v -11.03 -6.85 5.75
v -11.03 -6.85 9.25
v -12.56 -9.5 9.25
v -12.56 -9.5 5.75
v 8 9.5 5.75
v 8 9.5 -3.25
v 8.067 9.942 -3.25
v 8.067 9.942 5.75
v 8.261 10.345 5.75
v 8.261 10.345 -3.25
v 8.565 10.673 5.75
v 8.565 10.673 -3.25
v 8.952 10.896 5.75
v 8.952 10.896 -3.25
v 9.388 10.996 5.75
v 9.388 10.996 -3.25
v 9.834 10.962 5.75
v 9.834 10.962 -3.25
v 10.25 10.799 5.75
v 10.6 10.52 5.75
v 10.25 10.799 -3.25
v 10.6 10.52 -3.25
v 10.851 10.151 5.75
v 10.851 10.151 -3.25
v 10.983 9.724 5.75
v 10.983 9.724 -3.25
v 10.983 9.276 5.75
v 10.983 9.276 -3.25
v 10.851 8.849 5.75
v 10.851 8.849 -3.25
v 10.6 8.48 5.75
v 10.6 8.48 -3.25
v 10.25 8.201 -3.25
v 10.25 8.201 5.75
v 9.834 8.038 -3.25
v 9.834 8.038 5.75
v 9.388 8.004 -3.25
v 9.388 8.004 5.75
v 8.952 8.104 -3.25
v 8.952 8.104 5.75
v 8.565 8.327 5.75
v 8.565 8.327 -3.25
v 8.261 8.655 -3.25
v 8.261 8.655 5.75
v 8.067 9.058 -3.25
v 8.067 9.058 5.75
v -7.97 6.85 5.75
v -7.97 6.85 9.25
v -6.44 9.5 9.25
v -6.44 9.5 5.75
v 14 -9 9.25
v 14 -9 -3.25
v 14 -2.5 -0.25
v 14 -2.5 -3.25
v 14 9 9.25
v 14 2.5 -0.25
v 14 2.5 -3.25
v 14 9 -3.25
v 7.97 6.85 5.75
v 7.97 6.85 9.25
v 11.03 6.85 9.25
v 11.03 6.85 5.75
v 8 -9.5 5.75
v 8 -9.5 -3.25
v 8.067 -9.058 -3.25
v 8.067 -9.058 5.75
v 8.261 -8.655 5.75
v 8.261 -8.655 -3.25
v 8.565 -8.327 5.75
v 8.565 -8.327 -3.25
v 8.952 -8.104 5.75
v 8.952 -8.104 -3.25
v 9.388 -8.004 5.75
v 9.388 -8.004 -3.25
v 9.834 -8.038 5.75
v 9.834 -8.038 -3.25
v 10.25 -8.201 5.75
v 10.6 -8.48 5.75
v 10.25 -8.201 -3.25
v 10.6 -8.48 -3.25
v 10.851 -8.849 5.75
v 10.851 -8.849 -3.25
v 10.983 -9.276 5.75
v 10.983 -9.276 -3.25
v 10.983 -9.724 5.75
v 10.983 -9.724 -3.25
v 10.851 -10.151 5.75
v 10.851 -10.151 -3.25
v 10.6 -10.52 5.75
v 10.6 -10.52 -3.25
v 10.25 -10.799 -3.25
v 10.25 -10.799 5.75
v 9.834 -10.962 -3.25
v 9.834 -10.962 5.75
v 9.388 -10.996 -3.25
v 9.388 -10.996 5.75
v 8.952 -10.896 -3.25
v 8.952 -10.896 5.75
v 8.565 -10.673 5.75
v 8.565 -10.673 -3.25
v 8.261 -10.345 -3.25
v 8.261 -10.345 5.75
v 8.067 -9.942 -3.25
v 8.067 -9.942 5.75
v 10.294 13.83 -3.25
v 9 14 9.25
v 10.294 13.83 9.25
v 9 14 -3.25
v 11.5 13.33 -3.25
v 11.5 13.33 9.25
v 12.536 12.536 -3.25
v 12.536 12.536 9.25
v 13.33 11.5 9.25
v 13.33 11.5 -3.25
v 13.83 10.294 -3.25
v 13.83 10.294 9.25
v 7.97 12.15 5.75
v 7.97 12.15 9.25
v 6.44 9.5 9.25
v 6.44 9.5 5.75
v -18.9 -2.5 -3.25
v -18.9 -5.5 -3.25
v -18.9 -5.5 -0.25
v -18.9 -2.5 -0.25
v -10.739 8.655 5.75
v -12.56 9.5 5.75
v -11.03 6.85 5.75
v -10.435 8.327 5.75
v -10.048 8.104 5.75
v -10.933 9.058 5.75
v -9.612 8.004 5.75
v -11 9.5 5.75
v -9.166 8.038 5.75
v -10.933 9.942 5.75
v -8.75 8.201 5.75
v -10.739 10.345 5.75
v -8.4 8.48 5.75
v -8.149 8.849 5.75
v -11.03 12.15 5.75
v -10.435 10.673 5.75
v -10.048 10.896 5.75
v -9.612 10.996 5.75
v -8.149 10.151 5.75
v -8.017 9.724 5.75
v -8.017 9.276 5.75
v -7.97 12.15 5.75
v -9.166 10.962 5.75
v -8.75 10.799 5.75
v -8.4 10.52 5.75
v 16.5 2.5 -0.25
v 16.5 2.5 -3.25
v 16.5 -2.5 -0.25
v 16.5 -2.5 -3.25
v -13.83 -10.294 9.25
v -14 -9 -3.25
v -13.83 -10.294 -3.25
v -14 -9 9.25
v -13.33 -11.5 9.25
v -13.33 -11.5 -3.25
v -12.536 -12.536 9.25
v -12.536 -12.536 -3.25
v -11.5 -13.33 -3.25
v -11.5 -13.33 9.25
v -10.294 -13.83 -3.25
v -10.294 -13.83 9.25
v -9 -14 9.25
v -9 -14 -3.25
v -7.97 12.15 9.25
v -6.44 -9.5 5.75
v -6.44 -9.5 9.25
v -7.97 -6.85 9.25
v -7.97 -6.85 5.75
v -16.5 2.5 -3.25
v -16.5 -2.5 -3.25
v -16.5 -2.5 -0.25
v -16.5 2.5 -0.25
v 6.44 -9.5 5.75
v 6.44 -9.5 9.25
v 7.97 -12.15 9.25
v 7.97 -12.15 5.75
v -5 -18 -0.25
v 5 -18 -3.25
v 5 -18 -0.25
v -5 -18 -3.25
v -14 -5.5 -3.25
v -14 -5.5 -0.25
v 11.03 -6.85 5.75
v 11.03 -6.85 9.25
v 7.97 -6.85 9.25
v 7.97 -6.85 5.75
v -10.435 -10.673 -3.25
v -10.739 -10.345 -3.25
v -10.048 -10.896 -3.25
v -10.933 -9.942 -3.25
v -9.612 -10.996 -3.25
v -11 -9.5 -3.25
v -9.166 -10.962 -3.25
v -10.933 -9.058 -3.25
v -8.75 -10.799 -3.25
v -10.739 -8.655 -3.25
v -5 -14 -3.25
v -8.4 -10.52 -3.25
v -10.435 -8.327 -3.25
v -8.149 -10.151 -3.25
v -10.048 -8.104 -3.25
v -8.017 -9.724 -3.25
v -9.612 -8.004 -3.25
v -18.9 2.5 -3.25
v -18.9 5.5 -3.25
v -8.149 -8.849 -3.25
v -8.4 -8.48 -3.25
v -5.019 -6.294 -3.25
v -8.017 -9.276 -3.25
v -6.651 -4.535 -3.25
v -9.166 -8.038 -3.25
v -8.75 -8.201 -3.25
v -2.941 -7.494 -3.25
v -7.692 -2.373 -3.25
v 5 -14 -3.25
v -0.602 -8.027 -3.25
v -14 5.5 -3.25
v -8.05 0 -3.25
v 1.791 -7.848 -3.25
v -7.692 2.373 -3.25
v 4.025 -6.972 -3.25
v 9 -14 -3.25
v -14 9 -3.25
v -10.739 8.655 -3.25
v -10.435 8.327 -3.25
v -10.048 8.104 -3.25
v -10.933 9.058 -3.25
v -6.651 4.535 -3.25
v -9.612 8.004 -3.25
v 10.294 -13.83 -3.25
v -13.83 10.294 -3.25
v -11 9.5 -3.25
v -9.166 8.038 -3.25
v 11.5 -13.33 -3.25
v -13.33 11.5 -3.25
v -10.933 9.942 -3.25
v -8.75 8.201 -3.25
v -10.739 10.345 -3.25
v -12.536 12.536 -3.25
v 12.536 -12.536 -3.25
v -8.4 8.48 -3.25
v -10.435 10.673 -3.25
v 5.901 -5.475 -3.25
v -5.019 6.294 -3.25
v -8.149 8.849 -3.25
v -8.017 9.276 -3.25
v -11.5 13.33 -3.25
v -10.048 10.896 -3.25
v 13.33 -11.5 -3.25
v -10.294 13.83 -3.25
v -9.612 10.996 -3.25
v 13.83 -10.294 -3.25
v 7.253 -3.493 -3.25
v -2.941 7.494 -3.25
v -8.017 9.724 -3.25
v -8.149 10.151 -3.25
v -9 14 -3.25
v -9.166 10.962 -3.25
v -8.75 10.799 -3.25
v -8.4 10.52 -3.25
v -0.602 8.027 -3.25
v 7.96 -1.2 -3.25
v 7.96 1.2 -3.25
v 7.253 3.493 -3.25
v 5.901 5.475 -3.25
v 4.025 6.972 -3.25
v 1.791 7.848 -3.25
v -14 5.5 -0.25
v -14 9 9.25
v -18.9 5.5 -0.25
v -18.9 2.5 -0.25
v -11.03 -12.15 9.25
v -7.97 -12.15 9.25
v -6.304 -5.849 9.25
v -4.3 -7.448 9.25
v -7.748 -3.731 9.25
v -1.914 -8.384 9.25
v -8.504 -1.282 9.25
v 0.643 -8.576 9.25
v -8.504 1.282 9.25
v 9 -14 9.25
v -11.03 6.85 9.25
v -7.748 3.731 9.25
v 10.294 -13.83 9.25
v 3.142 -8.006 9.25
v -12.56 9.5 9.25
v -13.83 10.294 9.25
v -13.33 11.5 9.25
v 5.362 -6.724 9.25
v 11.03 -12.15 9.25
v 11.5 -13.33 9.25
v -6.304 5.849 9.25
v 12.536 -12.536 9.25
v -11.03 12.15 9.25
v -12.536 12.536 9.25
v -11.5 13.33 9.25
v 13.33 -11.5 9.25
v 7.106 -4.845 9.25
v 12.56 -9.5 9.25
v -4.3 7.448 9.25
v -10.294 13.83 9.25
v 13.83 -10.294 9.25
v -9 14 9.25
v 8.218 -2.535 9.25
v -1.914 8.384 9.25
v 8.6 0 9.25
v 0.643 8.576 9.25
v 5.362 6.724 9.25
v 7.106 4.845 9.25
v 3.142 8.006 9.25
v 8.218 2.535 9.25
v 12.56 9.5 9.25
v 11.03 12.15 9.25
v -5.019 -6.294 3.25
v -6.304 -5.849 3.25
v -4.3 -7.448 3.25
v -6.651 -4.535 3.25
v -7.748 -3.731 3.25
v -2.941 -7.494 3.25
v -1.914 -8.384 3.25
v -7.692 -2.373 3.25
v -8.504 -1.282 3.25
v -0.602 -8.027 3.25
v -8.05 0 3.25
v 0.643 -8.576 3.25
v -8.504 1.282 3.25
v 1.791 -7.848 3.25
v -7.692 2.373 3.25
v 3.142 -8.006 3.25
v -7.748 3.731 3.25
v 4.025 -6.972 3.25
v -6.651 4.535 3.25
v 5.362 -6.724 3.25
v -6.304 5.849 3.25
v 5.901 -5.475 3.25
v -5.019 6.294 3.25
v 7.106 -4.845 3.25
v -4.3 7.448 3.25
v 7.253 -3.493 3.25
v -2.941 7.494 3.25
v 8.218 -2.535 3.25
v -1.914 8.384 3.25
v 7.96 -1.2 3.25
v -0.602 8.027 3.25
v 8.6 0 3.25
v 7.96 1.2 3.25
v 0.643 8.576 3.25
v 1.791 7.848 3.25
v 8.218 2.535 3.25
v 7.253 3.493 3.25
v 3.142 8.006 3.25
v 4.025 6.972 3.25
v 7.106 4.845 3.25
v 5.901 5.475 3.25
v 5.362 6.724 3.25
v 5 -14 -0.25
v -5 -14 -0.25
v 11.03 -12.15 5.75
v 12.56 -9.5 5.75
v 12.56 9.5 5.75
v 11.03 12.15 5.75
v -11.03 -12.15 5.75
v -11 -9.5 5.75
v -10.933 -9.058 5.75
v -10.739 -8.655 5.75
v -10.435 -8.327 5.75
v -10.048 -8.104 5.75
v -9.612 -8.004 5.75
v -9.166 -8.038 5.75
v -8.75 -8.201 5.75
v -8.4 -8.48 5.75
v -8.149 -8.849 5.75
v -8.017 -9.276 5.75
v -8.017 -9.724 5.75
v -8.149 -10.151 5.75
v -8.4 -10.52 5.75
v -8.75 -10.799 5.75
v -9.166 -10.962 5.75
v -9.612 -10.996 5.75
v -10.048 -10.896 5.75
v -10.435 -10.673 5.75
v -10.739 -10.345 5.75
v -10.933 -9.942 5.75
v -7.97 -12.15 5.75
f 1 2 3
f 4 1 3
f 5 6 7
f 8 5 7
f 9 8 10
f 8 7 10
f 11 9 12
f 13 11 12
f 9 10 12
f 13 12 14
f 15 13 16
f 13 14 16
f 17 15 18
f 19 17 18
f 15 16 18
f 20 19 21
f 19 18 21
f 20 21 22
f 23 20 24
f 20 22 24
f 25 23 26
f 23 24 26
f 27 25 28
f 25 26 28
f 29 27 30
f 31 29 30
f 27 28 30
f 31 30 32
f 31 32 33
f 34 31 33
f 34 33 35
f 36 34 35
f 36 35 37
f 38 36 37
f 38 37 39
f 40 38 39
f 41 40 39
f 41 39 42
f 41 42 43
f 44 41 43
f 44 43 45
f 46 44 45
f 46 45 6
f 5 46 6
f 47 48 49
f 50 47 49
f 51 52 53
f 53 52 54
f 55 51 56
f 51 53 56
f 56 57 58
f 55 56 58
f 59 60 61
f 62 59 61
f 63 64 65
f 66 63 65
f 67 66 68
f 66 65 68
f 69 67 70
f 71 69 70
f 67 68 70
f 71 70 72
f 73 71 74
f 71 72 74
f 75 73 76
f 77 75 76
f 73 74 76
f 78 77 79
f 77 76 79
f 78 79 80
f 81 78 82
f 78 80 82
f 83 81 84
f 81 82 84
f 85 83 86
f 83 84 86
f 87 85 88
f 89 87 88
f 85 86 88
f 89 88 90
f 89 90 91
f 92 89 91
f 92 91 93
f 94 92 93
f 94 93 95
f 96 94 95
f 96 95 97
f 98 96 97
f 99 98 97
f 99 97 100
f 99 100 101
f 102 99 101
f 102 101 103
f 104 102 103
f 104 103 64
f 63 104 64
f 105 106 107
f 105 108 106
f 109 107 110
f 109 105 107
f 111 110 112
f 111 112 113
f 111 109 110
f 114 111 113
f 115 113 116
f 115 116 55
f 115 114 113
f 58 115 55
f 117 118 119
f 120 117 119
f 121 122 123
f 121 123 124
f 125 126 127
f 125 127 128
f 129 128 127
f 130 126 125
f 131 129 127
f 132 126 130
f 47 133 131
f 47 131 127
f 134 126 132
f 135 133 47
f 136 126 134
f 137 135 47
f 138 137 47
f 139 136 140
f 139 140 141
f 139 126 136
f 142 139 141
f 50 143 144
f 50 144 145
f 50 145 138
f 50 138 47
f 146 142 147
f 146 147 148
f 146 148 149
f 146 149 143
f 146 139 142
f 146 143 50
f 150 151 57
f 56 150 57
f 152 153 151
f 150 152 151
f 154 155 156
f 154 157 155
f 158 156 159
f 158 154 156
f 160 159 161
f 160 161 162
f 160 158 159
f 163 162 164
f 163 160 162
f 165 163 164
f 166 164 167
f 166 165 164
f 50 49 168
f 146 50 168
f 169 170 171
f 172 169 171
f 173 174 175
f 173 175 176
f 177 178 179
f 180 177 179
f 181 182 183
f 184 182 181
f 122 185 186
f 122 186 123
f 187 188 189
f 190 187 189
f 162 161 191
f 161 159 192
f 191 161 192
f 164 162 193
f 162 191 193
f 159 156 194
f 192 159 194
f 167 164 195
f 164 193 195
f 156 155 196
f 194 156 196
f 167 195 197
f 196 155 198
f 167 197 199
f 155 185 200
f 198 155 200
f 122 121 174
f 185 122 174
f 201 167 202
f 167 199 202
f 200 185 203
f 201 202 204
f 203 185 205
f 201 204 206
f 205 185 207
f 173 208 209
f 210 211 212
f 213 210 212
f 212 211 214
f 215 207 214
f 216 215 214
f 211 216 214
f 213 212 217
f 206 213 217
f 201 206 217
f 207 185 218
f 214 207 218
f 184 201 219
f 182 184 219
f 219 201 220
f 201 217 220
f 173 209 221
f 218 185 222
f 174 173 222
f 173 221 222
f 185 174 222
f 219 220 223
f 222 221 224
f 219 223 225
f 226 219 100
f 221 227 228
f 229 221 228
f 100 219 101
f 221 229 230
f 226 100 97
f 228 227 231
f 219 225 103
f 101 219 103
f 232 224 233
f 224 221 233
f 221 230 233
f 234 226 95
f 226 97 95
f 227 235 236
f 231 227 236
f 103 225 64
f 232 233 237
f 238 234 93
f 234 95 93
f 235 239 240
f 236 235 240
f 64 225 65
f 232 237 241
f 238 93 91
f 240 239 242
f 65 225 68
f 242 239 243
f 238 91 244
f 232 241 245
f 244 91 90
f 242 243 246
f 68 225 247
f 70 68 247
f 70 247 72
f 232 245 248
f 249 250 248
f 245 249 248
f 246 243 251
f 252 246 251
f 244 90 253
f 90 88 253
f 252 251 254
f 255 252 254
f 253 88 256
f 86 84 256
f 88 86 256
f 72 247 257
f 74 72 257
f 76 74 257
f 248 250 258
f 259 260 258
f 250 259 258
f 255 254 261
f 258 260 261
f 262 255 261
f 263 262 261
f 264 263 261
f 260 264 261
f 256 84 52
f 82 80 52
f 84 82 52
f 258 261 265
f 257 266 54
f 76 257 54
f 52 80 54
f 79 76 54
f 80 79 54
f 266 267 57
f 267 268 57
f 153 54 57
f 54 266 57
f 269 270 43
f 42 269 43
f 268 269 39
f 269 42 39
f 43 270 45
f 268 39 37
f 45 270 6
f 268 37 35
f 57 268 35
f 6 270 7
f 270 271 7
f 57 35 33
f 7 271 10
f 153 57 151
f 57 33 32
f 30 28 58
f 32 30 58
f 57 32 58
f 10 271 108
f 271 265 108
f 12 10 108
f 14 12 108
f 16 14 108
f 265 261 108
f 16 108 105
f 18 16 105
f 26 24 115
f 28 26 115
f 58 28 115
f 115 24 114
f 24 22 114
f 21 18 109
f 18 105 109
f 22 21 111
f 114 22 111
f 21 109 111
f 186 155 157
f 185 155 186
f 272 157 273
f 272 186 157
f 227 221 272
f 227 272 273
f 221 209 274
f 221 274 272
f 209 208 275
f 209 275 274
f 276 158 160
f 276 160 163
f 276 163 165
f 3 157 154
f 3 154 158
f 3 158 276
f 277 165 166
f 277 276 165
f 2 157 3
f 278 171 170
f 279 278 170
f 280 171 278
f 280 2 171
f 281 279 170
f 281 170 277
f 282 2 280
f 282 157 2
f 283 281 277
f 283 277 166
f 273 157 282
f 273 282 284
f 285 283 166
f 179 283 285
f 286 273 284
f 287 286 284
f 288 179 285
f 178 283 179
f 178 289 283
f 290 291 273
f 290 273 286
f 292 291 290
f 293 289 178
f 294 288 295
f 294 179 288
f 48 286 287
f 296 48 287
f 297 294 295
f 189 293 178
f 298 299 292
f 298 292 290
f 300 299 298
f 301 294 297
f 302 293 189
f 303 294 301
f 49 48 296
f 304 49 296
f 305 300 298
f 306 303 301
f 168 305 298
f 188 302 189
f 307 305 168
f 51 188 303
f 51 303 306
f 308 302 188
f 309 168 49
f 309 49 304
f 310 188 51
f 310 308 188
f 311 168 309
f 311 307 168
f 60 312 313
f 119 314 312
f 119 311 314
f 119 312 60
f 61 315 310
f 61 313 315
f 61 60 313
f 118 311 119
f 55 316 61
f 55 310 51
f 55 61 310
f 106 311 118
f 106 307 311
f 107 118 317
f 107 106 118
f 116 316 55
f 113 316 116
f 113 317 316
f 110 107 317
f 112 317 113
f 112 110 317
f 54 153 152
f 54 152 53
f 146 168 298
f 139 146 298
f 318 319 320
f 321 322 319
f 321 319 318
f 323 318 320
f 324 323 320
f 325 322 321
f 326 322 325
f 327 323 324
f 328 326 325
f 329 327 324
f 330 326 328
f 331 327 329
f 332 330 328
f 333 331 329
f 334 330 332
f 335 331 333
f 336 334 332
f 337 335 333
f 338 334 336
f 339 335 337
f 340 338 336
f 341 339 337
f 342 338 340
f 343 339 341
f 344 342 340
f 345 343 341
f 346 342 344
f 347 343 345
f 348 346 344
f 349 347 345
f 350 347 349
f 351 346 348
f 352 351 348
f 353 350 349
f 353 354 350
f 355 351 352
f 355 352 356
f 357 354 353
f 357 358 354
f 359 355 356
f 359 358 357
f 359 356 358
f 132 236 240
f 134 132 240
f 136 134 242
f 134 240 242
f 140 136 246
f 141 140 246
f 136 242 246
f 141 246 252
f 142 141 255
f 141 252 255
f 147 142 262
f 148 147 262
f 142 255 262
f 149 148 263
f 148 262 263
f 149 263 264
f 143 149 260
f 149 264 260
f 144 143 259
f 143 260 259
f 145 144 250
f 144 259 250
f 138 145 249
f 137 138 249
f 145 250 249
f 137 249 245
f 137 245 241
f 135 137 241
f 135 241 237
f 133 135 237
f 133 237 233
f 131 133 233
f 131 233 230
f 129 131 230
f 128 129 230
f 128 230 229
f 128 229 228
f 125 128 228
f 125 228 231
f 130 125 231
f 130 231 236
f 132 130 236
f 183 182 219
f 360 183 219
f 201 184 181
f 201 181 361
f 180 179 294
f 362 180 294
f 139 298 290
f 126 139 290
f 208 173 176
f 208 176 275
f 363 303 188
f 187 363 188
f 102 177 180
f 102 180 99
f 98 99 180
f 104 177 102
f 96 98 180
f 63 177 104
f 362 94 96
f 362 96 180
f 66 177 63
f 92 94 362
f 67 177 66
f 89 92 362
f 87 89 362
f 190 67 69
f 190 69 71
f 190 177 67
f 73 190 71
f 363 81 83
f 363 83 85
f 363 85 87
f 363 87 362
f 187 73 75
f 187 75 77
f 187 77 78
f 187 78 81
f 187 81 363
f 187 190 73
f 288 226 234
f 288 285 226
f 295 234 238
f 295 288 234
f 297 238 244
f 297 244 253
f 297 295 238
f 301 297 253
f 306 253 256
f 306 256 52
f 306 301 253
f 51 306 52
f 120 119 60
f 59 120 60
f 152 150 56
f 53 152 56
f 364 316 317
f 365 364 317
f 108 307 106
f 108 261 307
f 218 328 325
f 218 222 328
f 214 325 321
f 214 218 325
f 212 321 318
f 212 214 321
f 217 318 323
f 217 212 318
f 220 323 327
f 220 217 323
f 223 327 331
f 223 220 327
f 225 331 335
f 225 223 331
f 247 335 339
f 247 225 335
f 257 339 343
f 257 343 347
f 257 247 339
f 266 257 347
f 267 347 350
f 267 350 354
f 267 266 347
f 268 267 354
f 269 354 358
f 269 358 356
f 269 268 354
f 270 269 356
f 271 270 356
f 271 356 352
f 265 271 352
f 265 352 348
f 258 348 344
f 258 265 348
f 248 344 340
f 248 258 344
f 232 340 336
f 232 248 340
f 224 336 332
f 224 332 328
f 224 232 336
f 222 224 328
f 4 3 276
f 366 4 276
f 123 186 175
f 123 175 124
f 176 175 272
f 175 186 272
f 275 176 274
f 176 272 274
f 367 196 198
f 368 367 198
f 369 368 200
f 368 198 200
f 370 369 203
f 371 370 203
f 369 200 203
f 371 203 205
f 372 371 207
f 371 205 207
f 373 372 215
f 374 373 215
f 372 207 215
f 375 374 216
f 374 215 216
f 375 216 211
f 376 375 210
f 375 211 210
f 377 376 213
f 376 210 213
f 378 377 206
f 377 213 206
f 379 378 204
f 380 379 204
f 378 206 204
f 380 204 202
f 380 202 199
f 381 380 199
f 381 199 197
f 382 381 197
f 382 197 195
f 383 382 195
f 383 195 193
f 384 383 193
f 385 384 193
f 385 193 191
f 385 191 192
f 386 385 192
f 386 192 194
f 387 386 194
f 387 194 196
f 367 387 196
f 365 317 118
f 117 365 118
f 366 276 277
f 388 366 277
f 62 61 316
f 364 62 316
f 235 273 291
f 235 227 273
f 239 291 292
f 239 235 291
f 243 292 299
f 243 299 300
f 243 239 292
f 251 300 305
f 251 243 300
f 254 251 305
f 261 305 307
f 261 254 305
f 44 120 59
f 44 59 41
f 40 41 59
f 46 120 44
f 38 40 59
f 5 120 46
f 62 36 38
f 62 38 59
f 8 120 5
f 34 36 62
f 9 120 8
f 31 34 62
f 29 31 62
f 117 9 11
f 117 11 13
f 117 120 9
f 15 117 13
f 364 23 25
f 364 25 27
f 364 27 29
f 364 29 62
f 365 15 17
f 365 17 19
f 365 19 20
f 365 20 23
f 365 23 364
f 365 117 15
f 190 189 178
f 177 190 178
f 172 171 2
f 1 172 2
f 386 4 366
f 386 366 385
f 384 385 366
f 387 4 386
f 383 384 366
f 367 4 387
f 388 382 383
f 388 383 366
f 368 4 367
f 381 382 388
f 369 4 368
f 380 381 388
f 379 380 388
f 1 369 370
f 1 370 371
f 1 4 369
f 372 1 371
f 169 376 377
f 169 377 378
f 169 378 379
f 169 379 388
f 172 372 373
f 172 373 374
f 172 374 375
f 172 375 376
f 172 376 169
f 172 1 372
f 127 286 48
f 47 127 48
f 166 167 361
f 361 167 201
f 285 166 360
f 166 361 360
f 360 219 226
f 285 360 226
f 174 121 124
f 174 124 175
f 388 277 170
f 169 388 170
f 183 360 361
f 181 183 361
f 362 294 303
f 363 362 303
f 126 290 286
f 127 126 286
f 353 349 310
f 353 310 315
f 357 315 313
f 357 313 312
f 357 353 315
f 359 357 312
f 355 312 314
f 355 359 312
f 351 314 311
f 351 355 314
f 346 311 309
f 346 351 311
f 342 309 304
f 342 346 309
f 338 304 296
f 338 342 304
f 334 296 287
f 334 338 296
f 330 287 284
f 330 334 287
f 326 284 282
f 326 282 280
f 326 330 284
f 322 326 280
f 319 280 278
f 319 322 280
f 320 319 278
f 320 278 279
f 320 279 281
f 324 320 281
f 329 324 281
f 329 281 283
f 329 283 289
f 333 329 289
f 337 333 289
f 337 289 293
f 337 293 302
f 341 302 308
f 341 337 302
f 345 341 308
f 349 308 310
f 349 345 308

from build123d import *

# Parameters (mm, degrees)
CROQUIS1_W              = 28
CROQUIS1_H              = 28
CROQUIS1_R              = 8.05
SALIENTE_EXTRUIR1_DEPTH = 3.25
CROQUIS2_W              = 28
CROQUIS2_H              = 28
CROQUIS2_R              = 8.6
SALIENTE_EXTRUIR2_DEPTH = 6
CORTAR_EXTRUIR1_DEPTH   = 3.5
CROQUIS6_R              = 1.5
CORTAR_EXTRUIR2_DEPTH   = 23.5
CROQUIS7_W              = 2.5
CROQUIS7_H              = 5
CROQUIS7_W_2            = 10
CROQUIS7_H_2            = 4
SALIENTE_EXTRUIR3_DEPTH = 3
REDONDEO1_R             = 5


with BuildPart() as part:
    # Croquis1 → Saliente-Extruir1 (new, symmetric)
    with BuildSketch(Plane.XY):
        Rectangle(CROQUIS1_W, CROQUIS1_H)
        with Locations(Location((0, 0, 0), (0, 0, 180))):
            Circle(CROQUIS1_R, mode=Mode.SUBTRACT)
    extrude(amount=SALIENTE_EXTRUIR1_DEPTH, both=True)

    # Croquis2 → Saliente-Extruir2 (add)
    with BuildSketch(Plane.XY.offset(3.25)):
        Rectangle(CROQUIS2_W, CROQUIS2_H)
        Circle(CROQUIS2_R, mode=Mode.SUBTRACT)
    extrude(amount=SALIENTE_EXTRUIR2_DEPTH)

    # Croquis3 → Cortar-Extruir1 (cut)
    with BuildSketch(Plane.XY.offset(9.25)):
        Polygon((11.029978213, 12.15), (7.970021787, 12.15), (6.440043573, 9.5), (7.970021787, 6.85), (11.029978213, 6.85), (12.559956427, 9.5), align=None)
        Polygon((-6.440043573, 9.5), (-7.970021787, 12.15), (-11.029978213, 12.15), (-12.559956427, 9.5), (-11.029978213, 6.85), (-7.970021787, 6.85), align=None)
        Polygon((-7.970021787, -6.85), (-11.029978213, -6.85), (-12.559956427, -9.5), (-11.029978213, -12.15), (-7.970021787, -12.15), (-6.440043573, -9.5), align=None)
        Polygon((11.029978213, -6.85), (7.970021787, -6.85), (6.440043573, -9.5), (7.970021787, -12.15), (11.029978213, -12.15), (12.559956427, -9.5), align=None)
    extrude(amount=-CORTAR_EXTRUIR1_DEPTH, mode=Mode.SUBTRACT)

    # Croquis6 → Cortar-Extruir2 (cut)
    with BuildSketch(Plane(origin=(0, 0, -3.25), x_dir=(-1, 0, 0), z_dir=(0, 0, -1))):
        with Locations((-9.5, 9.5)):
            Circle(CROQUIS6_R)
        with Locations((9.5, 9.5)):
            Circle(CROQUIS6_R)
        with Locations((9.5, -9.5)):
            Circle(CROQUIS6_R)
        with Locations((-9.5, -9.5)):
            Circle(CROQUIS6_R)
    extrude(amount=-CORTAR_EXTRUIR2_DEPTH, mode=Mode.SUBTRACT)

    # Croquis7 → Saliente-Extruir3 (add)
    with BuildSketch(Plane(origin=(0, 0, -3.25), x_dir=(-1, 0, 0), z_dir=(0, 0, -1))):
        Polygon((14, 5.5), (14, 2.5), (16.5, 2.5), (18.9, 2.5), (18.9, 5.5), align=None)
        with Locations((15.25, 0)):
            Rectangle(CROQUIS7_W, CROQUIS7_H)
        Polygon((14, -2.5), (14, -5.5), (18.9, -5.5), (18.9, -2.5), (16.5, -2.5), align=None)
        with Locations((0, -16)):
            Rectangle(CROQUIS7_W_2, CROQUIS7_H_2)
        with Locations((-15.25, 0)):
            Rectangle(CROQUIS7_W, CROQUIS7_H)
    extrude(amount=-SALIENTE_EXTRUIR3_DEPTH)

    # Redondeo1
    redondeo1_edges = [part.edges().sort_by_distance(p)[0] for p in [
        (14, -14, 3),
        (-14, -14, 3),
        (-14, 14, 3),
        (14, 14, 3),
    ]]
    fillet(redondeo1_edges, radius=REDONDEO1_R)


solid = part.part
